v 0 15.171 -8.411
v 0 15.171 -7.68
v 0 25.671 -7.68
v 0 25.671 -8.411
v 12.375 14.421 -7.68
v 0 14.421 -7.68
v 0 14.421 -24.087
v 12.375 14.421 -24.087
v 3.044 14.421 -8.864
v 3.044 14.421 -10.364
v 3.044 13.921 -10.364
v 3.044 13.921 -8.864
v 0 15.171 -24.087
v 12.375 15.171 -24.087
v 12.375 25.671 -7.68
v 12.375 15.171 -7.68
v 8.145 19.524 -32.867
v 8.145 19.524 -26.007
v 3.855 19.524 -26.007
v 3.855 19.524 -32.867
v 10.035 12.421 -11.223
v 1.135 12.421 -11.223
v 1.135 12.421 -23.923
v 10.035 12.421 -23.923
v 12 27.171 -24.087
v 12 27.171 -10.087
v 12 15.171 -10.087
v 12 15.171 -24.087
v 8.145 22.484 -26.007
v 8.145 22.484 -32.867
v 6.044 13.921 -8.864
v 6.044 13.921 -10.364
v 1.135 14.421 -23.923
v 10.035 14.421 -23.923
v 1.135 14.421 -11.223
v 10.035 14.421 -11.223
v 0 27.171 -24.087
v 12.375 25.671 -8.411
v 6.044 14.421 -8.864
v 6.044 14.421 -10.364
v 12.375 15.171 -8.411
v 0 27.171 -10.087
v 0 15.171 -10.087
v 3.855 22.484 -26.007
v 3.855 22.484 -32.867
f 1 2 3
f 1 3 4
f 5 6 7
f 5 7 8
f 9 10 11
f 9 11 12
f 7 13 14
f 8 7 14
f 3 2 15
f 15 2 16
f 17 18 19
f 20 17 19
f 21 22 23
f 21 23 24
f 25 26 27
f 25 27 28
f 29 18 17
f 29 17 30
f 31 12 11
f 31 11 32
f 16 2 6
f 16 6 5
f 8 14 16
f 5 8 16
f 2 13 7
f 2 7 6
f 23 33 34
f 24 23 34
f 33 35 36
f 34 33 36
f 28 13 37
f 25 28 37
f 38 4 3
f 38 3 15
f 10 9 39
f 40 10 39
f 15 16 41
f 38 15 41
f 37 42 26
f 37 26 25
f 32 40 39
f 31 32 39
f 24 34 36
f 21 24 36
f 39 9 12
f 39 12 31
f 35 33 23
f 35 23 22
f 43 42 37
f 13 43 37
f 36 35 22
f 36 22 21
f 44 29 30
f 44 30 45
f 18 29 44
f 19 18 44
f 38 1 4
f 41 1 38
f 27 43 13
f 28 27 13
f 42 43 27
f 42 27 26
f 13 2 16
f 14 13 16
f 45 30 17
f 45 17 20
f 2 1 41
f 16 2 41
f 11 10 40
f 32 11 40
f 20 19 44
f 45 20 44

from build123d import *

# Parameters (mm, degrees)
SKETCH1_W        = 14
SKETCH1_H        = 12
BATTERY_DEPTH    = 12
SKETCH2_W        = 4.29
SKETCH2_H        = 2.96
DRIVER_DEPTH     = 6.86
SKETCH10_W       = 12.375
SKETCH10_H       = 16.407214065
PCB_DEPTH        = 0.75
SKETCH11_W       = 8.9
SKETCH11_H       = 12.7
KLR_DEVICE_DEPTH = 2
SKETCH12_W       = 3
SKETCH12_H       = 1.5
ANTENNA_DEPTH    = 0.5
SKETCH13_W       = 12.375
SKETCH13_H       = 0.730661869
SUBSTRATE_DEPTH  = 10.5


with BuildPart() as part:
    # Sketch1 → battery (new body)
    with BuildSketch(Plane(origin=(0, 0, 0), x_dir=(0, 0, -1), z_dir=(1, 0, 0))):
        with Locations((17.087318323, 21.170679999)):
            Rectangle(SKETCH1_W, SKETCH1_H)
    extrude(amount=BATTERY_DEPTH)


with BuildPart() as body_2:
    # Sketch2 → driver (new body)
    with BuildSketch(Plane(origin=(0, 0, -26.007318323), x_dir=(-1, 0, 0), z_dir=(0, 0, -1))):
        with Locations((-6, 21.003531679)):
            Rectangle(SKETCH2_W, SKETCH2_H)
    extrude(amount=DRIVER_DEPTH)


with BuildPart() as body_3:
    # Sketch10 → PCB (new body)
    with BuildSketch(Plane.XZ.offset(-15.170679999)):
        with Locations((6.1875, -15.883711291)):
            Rectangle(SKETCH10_W, SKETCH10_H)
    extrude(amount=PCB_DEPTH)


with BuildPart() as body_4:
    # Sketch11 → KLR device (new body)
    with BuildSketch(Plane.XZ.offset(-14.420679999)):
        with Locations((5.584658381, -17.573378155)):
            Rectangle(SKETCH11_W, SKETCH11_H)
    extrude(amount=KLR_DEVICE_DEPTH)


with BuildPart() as body_5:
    # Sketch12 → antenna (new body)
    with BuildSketch(Plane.XZ.offset(-14.420679999)):
        with Locations((4.544033237, -9.614053485)):
            Rectangle(SKETCH12_W, SKETCH12_H)
    extrude(amount=ANTENNA_DEPTH)


with BuildPart() as body_6:
    # Sketch13 → substrate (new body)
    with BuildSketch(Plane(origin=(0, 15.170679999, 0), x_dir=(1, 0, 0), z_dir=(0, 1, 0))):
        with Locations((6.1875, 8.045435193)):
            Rectangle(SKETCH13_W, SKETCH13_H)
    extrude(amount=SUBSTRATE_DEPTH)


solid = Compound([part.part, body_2.part, body_3.part, body_4.part, body_5.part, body_6.part])
